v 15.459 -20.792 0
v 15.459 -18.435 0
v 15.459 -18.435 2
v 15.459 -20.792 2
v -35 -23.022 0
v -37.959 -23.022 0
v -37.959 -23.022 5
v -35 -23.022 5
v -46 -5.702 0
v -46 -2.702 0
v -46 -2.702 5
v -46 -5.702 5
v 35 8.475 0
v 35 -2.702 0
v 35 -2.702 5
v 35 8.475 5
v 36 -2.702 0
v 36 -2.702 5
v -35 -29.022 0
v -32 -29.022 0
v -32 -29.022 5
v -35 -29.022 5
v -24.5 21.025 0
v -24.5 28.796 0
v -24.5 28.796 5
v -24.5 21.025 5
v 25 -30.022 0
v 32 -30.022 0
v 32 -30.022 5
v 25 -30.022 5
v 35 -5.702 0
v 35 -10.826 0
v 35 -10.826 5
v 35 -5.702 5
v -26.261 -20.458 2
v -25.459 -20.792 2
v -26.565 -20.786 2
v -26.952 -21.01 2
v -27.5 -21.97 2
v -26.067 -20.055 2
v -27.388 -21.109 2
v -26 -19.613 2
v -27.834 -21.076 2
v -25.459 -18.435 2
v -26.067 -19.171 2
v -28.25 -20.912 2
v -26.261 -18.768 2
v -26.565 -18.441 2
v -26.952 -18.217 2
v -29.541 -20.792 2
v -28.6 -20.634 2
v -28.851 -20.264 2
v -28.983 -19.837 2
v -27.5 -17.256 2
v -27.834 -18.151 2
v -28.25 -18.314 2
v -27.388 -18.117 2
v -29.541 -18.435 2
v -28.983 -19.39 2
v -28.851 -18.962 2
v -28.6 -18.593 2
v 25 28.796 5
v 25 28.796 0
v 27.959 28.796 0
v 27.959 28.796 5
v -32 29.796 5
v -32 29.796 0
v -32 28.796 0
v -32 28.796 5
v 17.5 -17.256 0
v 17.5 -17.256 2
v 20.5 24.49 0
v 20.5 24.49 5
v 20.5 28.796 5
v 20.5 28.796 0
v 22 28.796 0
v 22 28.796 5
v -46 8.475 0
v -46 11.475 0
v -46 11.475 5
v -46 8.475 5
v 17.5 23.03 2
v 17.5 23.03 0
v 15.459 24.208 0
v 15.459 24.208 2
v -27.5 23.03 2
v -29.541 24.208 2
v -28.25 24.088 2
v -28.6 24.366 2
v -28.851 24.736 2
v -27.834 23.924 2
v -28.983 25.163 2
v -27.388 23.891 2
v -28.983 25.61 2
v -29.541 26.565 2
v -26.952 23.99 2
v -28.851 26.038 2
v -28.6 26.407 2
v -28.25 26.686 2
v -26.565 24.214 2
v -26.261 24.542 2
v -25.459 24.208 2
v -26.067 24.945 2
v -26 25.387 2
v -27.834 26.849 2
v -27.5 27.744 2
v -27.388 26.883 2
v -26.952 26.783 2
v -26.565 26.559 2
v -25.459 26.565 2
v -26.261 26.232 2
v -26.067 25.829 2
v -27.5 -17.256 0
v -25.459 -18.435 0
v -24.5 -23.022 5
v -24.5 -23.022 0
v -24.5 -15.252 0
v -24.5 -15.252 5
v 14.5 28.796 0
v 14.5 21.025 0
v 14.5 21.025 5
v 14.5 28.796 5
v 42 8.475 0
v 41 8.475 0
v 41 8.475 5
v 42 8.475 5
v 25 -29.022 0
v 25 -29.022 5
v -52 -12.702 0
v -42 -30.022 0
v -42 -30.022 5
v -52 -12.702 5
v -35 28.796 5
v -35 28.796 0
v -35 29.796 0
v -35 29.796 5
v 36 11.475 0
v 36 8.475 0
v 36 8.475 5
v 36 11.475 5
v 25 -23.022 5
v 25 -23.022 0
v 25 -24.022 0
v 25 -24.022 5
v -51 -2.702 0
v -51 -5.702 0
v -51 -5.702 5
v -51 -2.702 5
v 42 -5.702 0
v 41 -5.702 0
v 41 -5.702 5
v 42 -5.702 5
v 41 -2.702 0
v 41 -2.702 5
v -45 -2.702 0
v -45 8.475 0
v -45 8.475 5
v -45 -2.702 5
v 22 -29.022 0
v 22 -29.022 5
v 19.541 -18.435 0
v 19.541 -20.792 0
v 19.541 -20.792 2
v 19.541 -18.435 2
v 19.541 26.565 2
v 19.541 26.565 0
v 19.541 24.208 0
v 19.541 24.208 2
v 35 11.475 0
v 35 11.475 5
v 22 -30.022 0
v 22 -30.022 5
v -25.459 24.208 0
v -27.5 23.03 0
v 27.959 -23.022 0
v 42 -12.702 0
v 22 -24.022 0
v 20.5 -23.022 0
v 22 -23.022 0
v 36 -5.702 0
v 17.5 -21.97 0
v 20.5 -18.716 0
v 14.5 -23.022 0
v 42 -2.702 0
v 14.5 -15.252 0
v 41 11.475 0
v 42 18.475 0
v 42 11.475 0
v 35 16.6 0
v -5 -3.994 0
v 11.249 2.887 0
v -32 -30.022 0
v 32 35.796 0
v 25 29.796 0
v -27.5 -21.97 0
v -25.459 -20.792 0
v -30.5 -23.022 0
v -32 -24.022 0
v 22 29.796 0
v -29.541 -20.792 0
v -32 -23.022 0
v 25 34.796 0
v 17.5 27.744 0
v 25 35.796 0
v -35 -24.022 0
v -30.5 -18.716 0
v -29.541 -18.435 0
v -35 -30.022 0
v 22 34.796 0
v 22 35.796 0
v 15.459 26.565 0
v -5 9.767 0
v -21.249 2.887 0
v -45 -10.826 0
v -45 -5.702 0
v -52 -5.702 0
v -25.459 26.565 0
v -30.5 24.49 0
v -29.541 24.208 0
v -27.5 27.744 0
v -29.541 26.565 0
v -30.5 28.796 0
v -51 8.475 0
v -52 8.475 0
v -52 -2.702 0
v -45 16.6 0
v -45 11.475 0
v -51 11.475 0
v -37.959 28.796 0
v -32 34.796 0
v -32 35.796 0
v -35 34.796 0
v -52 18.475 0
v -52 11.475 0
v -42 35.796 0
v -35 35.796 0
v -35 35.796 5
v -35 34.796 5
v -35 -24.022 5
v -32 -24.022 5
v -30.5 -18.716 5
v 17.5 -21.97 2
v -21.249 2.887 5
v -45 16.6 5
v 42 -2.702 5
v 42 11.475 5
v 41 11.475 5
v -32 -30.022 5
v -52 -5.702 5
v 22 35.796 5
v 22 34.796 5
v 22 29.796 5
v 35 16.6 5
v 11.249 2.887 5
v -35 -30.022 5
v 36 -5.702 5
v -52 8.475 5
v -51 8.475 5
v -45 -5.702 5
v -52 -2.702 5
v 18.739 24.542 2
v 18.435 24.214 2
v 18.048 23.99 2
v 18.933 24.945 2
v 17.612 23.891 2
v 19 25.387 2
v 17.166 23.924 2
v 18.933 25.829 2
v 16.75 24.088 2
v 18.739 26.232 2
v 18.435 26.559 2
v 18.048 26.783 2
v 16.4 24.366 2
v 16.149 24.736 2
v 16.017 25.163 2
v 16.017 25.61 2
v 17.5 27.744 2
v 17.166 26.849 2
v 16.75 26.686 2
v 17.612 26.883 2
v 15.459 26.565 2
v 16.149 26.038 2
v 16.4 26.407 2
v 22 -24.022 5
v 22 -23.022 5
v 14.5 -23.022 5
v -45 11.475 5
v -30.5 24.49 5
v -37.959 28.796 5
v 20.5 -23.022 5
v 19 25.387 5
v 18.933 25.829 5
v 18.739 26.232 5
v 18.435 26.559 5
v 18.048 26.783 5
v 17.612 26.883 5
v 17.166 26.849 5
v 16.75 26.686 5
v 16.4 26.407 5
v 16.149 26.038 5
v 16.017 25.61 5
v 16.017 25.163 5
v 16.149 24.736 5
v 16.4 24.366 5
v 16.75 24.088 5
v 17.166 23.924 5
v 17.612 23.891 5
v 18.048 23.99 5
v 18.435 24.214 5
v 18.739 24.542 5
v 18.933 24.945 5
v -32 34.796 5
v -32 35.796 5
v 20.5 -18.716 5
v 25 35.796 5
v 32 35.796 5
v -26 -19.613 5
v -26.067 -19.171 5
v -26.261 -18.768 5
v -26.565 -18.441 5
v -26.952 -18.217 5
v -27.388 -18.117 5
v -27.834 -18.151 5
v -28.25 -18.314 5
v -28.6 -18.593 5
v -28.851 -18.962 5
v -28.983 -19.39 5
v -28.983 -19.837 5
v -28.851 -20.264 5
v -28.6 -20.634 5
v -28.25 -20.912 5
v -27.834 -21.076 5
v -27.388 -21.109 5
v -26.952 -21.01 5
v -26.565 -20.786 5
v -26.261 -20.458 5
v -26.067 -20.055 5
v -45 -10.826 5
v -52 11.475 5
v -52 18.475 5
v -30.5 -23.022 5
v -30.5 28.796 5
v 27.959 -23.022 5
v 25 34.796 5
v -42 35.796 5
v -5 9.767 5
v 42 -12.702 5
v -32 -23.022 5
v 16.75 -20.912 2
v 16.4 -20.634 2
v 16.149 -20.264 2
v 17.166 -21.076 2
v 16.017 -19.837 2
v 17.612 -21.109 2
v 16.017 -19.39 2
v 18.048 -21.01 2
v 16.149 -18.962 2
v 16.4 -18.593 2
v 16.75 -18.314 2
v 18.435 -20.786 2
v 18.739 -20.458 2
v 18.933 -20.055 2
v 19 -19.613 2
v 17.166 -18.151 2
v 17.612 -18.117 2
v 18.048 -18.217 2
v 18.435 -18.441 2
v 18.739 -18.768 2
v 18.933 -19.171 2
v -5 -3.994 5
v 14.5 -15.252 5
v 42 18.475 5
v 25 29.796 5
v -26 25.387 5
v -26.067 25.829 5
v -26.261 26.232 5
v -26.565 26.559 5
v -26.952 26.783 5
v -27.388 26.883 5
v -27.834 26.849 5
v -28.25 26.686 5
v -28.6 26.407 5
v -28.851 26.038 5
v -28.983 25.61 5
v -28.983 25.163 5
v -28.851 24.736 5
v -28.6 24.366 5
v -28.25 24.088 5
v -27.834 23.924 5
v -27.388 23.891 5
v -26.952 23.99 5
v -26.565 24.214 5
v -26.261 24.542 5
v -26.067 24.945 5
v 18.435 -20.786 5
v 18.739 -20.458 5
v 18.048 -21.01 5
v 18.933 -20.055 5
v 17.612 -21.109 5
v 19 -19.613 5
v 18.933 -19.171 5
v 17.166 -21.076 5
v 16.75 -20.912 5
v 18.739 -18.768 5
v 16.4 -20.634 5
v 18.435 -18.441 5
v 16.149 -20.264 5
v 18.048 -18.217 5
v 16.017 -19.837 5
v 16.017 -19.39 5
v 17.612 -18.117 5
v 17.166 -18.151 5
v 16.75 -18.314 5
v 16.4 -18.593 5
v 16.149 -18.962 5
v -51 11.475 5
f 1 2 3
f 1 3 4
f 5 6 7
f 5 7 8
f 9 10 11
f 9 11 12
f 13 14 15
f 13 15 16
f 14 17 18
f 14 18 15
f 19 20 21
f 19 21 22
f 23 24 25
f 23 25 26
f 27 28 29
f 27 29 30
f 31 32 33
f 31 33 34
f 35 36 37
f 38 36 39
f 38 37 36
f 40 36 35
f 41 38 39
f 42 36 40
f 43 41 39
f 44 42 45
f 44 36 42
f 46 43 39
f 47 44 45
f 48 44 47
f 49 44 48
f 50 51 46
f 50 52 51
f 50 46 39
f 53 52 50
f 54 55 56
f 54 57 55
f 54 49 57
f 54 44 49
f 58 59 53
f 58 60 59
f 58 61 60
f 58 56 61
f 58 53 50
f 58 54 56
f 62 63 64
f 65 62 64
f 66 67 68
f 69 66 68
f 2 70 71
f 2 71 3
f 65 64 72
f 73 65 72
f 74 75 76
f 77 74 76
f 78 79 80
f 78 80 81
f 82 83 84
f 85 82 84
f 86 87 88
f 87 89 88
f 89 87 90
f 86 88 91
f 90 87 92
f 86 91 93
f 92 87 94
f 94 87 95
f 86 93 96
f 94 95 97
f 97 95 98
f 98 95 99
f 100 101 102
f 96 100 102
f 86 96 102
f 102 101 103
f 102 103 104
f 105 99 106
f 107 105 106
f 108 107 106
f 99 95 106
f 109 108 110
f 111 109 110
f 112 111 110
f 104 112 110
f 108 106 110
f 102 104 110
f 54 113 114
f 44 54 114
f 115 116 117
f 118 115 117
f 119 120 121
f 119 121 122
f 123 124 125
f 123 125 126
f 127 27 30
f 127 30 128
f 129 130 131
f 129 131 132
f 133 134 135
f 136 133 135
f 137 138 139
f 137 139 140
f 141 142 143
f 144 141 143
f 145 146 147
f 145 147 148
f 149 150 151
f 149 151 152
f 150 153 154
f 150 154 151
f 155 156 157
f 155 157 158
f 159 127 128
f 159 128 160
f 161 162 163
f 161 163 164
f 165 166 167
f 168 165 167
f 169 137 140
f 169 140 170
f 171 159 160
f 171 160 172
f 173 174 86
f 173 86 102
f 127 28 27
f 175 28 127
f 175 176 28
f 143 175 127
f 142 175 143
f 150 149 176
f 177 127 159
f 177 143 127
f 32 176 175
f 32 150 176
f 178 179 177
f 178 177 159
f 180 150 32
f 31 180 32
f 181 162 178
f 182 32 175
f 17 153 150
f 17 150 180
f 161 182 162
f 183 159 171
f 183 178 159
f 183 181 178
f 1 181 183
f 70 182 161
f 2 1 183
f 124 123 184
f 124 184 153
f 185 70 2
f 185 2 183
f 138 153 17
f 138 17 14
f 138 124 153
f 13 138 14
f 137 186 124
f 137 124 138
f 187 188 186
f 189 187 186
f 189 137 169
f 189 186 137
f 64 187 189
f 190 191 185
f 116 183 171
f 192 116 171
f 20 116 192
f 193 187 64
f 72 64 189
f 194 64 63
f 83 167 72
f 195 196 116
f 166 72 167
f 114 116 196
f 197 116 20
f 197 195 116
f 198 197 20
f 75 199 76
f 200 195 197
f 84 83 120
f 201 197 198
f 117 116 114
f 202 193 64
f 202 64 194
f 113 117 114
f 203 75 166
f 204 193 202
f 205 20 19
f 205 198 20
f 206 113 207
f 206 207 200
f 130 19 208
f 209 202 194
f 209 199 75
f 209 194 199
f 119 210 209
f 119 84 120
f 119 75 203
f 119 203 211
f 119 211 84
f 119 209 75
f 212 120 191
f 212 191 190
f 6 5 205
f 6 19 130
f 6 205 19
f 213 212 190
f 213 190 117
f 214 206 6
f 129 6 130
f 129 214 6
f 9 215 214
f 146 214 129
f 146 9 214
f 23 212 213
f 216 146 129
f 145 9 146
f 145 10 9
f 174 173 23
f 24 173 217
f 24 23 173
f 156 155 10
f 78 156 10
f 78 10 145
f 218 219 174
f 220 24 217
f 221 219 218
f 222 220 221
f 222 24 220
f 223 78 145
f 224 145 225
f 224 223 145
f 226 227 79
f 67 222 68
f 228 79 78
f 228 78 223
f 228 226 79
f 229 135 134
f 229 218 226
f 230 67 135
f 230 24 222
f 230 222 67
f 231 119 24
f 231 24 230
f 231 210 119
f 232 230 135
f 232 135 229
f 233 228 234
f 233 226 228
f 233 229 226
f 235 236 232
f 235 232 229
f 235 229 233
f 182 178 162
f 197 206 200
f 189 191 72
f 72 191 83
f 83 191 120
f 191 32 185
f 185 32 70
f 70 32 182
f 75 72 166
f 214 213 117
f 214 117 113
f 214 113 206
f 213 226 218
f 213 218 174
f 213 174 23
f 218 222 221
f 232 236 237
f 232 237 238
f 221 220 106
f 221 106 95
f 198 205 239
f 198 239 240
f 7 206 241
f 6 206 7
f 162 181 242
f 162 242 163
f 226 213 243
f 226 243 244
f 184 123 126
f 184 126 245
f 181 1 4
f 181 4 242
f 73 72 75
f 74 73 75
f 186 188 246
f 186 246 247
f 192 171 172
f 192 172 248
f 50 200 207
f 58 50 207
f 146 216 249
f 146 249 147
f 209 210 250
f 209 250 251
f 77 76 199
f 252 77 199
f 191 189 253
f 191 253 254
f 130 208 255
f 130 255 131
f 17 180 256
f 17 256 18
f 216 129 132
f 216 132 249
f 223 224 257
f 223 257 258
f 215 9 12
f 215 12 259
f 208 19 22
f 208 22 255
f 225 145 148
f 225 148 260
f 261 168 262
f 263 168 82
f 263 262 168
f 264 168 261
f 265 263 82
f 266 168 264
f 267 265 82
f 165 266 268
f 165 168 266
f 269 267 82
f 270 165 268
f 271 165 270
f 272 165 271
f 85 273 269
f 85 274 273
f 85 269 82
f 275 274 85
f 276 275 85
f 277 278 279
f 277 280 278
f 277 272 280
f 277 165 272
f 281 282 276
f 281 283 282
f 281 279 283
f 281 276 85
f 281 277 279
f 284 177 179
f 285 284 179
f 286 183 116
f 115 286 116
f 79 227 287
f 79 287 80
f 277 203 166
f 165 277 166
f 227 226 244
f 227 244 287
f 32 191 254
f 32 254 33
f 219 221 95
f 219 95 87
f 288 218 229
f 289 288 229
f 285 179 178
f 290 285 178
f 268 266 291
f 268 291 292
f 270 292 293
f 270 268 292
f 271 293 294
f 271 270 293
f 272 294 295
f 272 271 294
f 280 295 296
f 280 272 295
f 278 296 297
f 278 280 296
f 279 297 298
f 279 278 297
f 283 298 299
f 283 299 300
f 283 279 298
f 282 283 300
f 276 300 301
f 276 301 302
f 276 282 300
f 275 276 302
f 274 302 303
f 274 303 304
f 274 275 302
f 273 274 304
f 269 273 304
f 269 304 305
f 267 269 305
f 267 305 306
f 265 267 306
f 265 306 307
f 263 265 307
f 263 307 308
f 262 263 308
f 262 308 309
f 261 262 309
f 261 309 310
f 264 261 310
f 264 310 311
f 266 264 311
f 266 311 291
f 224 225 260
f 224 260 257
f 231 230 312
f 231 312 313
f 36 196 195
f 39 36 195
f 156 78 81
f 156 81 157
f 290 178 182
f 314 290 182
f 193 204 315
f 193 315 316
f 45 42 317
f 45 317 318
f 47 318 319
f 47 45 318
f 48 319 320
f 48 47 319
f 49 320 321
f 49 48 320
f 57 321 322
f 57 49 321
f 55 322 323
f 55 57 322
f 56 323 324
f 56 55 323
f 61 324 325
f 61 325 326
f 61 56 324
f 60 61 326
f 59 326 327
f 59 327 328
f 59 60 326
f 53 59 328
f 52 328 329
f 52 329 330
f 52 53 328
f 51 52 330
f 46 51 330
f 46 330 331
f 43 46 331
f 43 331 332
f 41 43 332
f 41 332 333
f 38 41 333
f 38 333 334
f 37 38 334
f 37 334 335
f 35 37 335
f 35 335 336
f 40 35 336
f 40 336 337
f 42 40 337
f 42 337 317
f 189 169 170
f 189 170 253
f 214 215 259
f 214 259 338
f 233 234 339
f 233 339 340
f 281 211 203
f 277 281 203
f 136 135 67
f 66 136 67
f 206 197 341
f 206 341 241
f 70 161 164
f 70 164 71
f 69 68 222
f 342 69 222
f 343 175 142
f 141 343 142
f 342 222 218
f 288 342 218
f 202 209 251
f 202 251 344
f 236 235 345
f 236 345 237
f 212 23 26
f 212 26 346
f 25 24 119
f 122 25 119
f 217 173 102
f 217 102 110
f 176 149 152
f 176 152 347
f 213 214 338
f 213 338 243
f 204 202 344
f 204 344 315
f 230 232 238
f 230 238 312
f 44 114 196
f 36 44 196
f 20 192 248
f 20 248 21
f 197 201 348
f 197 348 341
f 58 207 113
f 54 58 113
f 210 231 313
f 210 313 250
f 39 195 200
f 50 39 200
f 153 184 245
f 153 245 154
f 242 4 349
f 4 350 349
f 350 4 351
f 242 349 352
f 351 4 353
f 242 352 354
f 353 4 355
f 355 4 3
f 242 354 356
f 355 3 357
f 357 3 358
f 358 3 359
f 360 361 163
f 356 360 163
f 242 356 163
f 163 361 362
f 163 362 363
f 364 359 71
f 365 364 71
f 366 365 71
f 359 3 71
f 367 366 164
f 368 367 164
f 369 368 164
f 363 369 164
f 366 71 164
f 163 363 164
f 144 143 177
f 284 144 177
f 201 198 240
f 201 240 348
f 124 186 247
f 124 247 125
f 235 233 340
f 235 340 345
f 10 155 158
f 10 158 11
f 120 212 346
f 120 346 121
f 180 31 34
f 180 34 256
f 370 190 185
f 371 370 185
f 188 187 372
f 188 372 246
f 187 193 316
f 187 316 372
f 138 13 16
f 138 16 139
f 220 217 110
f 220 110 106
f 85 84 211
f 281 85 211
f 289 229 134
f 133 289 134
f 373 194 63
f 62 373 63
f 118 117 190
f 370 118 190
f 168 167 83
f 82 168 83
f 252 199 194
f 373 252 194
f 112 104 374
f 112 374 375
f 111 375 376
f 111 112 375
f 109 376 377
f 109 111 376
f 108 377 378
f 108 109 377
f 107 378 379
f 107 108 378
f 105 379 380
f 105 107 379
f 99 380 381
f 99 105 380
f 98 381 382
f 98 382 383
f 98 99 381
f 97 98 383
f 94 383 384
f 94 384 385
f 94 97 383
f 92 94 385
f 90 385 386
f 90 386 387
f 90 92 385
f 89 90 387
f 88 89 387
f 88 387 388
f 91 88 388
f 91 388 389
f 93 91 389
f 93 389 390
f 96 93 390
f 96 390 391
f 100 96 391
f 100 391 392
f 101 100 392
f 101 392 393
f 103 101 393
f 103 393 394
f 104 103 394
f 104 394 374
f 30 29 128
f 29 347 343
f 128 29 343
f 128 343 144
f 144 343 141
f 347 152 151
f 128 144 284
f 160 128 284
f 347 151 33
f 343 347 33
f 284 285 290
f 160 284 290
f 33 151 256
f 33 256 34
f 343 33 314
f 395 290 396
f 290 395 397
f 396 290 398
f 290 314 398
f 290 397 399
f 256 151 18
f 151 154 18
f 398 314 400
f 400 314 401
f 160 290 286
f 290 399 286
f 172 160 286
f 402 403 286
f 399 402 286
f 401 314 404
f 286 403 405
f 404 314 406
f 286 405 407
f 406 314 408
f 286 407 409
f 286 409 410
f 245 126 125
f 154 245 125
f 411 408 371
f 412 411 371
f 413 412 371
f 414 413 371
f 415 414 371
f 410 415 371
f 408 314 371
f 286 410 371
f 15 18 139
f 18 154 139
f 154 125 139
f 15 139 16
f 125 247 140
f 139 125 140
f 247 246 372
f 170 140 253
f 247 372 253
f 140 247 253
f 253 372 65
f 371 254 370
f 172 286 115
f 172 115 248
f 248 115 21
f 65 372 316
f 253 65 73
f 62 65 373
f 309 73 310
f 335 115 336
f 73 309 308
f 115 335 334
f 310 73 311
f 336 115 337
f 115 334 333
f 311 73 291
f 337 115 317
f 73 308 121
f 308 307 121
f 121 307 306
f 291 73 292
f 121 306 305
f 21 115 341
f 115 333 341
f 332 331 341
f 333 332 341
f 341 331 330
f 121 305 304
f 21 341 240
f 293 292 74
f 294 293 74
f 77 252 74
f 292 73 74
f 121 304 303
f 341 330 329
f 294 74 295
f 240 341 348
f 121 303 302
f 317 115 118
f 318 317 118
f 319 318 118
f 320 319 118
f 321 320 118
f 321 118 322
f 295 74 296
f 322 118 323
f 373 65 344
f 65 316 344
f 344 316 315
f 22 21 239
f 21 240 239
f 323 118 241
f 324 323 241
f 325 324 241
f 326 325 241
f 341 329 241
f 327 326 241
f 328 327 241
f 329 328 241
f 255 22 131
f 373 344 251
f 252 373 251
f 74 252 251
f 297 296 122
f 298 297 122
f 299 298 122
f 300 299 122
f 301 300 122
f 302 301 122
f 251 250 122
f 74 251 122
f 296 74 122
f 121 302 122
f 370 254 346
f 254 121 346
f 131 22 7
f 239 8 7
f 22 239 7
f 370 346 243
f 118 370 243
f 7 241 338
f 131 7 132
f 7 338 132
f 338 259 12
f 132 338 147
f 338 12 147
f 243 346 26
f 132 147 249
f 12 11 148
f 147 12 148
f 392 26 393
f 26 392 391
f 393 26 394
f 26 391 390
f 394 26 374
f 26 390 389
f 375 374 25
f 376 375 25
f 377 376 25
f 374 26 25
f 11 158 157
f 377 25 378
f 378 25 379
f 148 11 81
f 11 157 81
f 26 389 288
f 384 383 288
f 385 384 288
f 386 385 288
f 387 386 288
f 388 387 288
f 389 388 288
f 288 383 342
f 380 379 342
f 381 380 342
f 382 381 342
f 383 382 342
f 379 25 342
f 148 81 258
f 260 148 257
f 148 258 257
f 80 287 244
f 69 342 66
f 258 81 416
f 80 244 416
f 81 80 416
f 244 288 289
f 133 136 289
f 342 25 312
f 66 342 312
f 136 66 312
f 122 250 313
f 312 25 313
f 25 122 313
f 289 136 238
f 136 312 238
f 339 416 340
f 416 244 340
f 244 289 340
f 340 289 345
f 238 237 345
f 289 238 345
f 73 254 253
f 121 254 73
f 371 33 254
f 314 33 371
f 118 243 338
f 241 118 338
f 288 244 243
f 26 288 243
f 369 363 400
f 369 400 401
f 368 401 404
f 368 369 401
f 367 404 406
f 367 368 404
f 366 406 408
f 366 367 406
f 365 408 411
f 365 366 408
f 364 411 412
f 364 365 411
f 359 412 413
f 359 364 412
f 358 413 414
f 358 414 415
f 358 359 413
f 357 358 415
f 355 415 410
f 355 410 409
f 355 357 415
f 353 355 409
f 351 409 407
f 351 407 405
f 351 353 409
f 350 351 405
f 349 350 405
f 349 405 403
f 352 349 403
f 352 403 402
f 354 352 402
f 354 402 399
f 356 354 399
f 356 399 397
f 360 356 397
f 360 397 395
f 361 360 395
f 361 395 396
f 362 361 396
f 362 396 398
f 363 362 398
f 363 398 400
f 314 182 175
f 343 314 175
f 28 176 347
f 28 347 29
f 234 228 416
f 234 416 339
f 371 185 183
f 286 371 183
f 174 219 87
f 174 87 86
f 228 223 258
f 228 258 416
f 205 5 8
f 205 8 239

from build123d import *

# Parameters (mm, degrees)
ESQUISSE1_R             = 1.5
BOSS_EXTRU_2_DEPTH      = 5
ENL_V_MAT_EXTRU_2_DEPTH = 2


with BuildPart() as part:
    # Esquisse1 → Boss.-Extru.2 (new body)
    with BuildSketch(Plane.XY):
        Polygon((22, -30.022213998), (-32, -30.022213998), (-32, -29.022213998), (-35, -29.022213998), (-35, -30.022213998), (-42, -30.022213998), (-52, -12.701705922), (-52, -5.701705922), (-51, -5.701705922), (-51, -2.701705922), (-52, -2.701705922), (-52, 8.475208614), (-51, 8.475208614), (-51, 11.475208614), (-52, 11.475208614), (-52, 18.475208614), (-42, 35.79571669), (-35, 35.79571669), (-35, 34.79571669), (-32, 34.79571669), (-32, 35.79571669), (22, 35.79571669), (22, 34.79571669), (25, 34.79571669), (25, 35.79571669), (32, 35.79571669), (42, 18.475208614), (42, 11.475208614), (41, 11.475208614), (41, 8.475208614), (42, 8.475208614), (42, -2.701705922), (41, -2.701705922), (41, -5.701705922), (42, -5.701705922), (42, -12.701705922), (32, -30.022213998), (25, -30.022213998), (25, -29.022213998), (22, -29.022213998), align=None)
        with Locations((17.5, 25.386751346)):
            Circle(ESQUISSE1_R, mode=Mode.SUBTRACT)
        with Locations((-27.5, 25.386751346)):
            Circle(ESQUISSE1_R, mode=Mode.SUBTRACT)
        with Locations((17.5, -19.613248654)):
            Circle(ESQUISSE1_R, mode=Mode.SUBTRACT)
        with Locations((-27.5, -19.613248654)):
            Circle(ESQUISSE1_R, mode=Mode.SUBTRACT)
        Polygon((-45, 8.475208614), (-45, -2.701705922), (-46, -2.701705922), (-46, -5.701705922), (-45, -5.701705922), (-45, -10.826061575), (-21.248711306, 2.886751346), (-45, 16.599564267), (-45, 11.475208614), (-46, 11.475208614), (-46, 8.475208614), align=None, mode=Mode.SUBTRACT)
        Polygon((35, 16.599564267), (11.248711306, 2.886751346), (35, -10.826061575), (35, -5.701705922), (36, -5.701705922), (36, -2.701705922), (35, -2.701705922), (35, 8.475208614), (36, 8.475208614), (36, 11.475208614), (35, 11.475208614), align=None, mode=Mode.SUBTRACT)
        Polygon((-37.958548116, -23.022213998), (-35, -23.022213998), (-35, -24.022213998), (-32, -24.022213998), (-32, -23.022213998), (-30.5, -23.022213998), (-30.5, -18.716019236), align=None, mode=Mode.SUBTRACT)
        Polygon((14.5, -23.022213998), (-5, -23.022213998), (-24.5, -23.022213998), (-24.5, -15.25191762), (-5, -3.993587371), (14.5, -15.25191762), align=None, mode=Mode.SUBTRACT)
        Polygon((-32, 29.79571669), (-32, 28.79571669), (-30.5, 28.79571669), (-30.5, 24.489521927), (-37.958548116, 28.79571669), (-35, 28.79571669), (-35, 29.79571669), align=None, mode=Mode.SUBTRACT)
        Polygon((27.958548116, 28.79571669), (20.5, 24.489521927), (20.5, 28.79571669), (22, 28.79571669), (22, 29.79571669), (25, 29.79571669), (25, 28.79571669), align=None, mode=Mode.SUBTRACT)
        Polygon((22, -24.022213998), (22, -23.022213998), (20.5, -23.022213998), (20.5, -18.716019236), (27.958548116, -23.022213998), (25, -23.022213998), (25, -24.022213998), align=None, mode=Mode.SUBTRACT)
        Polygon((-24.5, 28.79571669), (-24.5, 21.025420312), (-5, 9.767090063), (14.5, 21.025420312), (14.5, 28.79571669), (-5, 28.79571669), align=None, mode=Mode.SUBTRACT)
    extrude(amount=BOSS_EXTRU_2_DEPTH)

    # Esquisse4 → Enlèv. mat.-Extru.2 (cut)
    with BuildSketch(Plane(origin=(0, 0, 0), x_dir=(-1, 0, 0), z_dir=(0, 0, -1))):
        Polygon((-17.5, 23.029642358), (-15.458683737, 24.208196852), (-15.458683737, 26.56530584), (-17.5, 27.743860334), (-19.541316263, 26.56530584), (-19.541316263, 24.208196852), align=None)
        Polygon((29.541316263, 24.208196852), (27.5, 23.029642358), (25.458683737, 24.208196852), (25.458683737, 26.56530584), (27.5, 27.743860334), (29.541316263, 26.56530584), align=None)
        Polygon((27.5, -17.256139666), (25.458683737, -18.43469416), (25.458683737, -20.791803148), (27.5, -21.970357642), (29.541316263, -20.791803148), (29.541316263, -18.43469416), align=None)
        Polygon((-19.541316263, -18.43469416), (-17.5, -17.256139666), (-15.458683737, -18.43469416), (-15.458683737, -20.791803148), (-17.5, -21.970357642), (-19.541316263, -20.791803148), align=None)
    extrude(amount=-ENL_V_MAT_EXTRU_2_DEPTH, mode=Mode.SUBTRACT)


solid = part.part
